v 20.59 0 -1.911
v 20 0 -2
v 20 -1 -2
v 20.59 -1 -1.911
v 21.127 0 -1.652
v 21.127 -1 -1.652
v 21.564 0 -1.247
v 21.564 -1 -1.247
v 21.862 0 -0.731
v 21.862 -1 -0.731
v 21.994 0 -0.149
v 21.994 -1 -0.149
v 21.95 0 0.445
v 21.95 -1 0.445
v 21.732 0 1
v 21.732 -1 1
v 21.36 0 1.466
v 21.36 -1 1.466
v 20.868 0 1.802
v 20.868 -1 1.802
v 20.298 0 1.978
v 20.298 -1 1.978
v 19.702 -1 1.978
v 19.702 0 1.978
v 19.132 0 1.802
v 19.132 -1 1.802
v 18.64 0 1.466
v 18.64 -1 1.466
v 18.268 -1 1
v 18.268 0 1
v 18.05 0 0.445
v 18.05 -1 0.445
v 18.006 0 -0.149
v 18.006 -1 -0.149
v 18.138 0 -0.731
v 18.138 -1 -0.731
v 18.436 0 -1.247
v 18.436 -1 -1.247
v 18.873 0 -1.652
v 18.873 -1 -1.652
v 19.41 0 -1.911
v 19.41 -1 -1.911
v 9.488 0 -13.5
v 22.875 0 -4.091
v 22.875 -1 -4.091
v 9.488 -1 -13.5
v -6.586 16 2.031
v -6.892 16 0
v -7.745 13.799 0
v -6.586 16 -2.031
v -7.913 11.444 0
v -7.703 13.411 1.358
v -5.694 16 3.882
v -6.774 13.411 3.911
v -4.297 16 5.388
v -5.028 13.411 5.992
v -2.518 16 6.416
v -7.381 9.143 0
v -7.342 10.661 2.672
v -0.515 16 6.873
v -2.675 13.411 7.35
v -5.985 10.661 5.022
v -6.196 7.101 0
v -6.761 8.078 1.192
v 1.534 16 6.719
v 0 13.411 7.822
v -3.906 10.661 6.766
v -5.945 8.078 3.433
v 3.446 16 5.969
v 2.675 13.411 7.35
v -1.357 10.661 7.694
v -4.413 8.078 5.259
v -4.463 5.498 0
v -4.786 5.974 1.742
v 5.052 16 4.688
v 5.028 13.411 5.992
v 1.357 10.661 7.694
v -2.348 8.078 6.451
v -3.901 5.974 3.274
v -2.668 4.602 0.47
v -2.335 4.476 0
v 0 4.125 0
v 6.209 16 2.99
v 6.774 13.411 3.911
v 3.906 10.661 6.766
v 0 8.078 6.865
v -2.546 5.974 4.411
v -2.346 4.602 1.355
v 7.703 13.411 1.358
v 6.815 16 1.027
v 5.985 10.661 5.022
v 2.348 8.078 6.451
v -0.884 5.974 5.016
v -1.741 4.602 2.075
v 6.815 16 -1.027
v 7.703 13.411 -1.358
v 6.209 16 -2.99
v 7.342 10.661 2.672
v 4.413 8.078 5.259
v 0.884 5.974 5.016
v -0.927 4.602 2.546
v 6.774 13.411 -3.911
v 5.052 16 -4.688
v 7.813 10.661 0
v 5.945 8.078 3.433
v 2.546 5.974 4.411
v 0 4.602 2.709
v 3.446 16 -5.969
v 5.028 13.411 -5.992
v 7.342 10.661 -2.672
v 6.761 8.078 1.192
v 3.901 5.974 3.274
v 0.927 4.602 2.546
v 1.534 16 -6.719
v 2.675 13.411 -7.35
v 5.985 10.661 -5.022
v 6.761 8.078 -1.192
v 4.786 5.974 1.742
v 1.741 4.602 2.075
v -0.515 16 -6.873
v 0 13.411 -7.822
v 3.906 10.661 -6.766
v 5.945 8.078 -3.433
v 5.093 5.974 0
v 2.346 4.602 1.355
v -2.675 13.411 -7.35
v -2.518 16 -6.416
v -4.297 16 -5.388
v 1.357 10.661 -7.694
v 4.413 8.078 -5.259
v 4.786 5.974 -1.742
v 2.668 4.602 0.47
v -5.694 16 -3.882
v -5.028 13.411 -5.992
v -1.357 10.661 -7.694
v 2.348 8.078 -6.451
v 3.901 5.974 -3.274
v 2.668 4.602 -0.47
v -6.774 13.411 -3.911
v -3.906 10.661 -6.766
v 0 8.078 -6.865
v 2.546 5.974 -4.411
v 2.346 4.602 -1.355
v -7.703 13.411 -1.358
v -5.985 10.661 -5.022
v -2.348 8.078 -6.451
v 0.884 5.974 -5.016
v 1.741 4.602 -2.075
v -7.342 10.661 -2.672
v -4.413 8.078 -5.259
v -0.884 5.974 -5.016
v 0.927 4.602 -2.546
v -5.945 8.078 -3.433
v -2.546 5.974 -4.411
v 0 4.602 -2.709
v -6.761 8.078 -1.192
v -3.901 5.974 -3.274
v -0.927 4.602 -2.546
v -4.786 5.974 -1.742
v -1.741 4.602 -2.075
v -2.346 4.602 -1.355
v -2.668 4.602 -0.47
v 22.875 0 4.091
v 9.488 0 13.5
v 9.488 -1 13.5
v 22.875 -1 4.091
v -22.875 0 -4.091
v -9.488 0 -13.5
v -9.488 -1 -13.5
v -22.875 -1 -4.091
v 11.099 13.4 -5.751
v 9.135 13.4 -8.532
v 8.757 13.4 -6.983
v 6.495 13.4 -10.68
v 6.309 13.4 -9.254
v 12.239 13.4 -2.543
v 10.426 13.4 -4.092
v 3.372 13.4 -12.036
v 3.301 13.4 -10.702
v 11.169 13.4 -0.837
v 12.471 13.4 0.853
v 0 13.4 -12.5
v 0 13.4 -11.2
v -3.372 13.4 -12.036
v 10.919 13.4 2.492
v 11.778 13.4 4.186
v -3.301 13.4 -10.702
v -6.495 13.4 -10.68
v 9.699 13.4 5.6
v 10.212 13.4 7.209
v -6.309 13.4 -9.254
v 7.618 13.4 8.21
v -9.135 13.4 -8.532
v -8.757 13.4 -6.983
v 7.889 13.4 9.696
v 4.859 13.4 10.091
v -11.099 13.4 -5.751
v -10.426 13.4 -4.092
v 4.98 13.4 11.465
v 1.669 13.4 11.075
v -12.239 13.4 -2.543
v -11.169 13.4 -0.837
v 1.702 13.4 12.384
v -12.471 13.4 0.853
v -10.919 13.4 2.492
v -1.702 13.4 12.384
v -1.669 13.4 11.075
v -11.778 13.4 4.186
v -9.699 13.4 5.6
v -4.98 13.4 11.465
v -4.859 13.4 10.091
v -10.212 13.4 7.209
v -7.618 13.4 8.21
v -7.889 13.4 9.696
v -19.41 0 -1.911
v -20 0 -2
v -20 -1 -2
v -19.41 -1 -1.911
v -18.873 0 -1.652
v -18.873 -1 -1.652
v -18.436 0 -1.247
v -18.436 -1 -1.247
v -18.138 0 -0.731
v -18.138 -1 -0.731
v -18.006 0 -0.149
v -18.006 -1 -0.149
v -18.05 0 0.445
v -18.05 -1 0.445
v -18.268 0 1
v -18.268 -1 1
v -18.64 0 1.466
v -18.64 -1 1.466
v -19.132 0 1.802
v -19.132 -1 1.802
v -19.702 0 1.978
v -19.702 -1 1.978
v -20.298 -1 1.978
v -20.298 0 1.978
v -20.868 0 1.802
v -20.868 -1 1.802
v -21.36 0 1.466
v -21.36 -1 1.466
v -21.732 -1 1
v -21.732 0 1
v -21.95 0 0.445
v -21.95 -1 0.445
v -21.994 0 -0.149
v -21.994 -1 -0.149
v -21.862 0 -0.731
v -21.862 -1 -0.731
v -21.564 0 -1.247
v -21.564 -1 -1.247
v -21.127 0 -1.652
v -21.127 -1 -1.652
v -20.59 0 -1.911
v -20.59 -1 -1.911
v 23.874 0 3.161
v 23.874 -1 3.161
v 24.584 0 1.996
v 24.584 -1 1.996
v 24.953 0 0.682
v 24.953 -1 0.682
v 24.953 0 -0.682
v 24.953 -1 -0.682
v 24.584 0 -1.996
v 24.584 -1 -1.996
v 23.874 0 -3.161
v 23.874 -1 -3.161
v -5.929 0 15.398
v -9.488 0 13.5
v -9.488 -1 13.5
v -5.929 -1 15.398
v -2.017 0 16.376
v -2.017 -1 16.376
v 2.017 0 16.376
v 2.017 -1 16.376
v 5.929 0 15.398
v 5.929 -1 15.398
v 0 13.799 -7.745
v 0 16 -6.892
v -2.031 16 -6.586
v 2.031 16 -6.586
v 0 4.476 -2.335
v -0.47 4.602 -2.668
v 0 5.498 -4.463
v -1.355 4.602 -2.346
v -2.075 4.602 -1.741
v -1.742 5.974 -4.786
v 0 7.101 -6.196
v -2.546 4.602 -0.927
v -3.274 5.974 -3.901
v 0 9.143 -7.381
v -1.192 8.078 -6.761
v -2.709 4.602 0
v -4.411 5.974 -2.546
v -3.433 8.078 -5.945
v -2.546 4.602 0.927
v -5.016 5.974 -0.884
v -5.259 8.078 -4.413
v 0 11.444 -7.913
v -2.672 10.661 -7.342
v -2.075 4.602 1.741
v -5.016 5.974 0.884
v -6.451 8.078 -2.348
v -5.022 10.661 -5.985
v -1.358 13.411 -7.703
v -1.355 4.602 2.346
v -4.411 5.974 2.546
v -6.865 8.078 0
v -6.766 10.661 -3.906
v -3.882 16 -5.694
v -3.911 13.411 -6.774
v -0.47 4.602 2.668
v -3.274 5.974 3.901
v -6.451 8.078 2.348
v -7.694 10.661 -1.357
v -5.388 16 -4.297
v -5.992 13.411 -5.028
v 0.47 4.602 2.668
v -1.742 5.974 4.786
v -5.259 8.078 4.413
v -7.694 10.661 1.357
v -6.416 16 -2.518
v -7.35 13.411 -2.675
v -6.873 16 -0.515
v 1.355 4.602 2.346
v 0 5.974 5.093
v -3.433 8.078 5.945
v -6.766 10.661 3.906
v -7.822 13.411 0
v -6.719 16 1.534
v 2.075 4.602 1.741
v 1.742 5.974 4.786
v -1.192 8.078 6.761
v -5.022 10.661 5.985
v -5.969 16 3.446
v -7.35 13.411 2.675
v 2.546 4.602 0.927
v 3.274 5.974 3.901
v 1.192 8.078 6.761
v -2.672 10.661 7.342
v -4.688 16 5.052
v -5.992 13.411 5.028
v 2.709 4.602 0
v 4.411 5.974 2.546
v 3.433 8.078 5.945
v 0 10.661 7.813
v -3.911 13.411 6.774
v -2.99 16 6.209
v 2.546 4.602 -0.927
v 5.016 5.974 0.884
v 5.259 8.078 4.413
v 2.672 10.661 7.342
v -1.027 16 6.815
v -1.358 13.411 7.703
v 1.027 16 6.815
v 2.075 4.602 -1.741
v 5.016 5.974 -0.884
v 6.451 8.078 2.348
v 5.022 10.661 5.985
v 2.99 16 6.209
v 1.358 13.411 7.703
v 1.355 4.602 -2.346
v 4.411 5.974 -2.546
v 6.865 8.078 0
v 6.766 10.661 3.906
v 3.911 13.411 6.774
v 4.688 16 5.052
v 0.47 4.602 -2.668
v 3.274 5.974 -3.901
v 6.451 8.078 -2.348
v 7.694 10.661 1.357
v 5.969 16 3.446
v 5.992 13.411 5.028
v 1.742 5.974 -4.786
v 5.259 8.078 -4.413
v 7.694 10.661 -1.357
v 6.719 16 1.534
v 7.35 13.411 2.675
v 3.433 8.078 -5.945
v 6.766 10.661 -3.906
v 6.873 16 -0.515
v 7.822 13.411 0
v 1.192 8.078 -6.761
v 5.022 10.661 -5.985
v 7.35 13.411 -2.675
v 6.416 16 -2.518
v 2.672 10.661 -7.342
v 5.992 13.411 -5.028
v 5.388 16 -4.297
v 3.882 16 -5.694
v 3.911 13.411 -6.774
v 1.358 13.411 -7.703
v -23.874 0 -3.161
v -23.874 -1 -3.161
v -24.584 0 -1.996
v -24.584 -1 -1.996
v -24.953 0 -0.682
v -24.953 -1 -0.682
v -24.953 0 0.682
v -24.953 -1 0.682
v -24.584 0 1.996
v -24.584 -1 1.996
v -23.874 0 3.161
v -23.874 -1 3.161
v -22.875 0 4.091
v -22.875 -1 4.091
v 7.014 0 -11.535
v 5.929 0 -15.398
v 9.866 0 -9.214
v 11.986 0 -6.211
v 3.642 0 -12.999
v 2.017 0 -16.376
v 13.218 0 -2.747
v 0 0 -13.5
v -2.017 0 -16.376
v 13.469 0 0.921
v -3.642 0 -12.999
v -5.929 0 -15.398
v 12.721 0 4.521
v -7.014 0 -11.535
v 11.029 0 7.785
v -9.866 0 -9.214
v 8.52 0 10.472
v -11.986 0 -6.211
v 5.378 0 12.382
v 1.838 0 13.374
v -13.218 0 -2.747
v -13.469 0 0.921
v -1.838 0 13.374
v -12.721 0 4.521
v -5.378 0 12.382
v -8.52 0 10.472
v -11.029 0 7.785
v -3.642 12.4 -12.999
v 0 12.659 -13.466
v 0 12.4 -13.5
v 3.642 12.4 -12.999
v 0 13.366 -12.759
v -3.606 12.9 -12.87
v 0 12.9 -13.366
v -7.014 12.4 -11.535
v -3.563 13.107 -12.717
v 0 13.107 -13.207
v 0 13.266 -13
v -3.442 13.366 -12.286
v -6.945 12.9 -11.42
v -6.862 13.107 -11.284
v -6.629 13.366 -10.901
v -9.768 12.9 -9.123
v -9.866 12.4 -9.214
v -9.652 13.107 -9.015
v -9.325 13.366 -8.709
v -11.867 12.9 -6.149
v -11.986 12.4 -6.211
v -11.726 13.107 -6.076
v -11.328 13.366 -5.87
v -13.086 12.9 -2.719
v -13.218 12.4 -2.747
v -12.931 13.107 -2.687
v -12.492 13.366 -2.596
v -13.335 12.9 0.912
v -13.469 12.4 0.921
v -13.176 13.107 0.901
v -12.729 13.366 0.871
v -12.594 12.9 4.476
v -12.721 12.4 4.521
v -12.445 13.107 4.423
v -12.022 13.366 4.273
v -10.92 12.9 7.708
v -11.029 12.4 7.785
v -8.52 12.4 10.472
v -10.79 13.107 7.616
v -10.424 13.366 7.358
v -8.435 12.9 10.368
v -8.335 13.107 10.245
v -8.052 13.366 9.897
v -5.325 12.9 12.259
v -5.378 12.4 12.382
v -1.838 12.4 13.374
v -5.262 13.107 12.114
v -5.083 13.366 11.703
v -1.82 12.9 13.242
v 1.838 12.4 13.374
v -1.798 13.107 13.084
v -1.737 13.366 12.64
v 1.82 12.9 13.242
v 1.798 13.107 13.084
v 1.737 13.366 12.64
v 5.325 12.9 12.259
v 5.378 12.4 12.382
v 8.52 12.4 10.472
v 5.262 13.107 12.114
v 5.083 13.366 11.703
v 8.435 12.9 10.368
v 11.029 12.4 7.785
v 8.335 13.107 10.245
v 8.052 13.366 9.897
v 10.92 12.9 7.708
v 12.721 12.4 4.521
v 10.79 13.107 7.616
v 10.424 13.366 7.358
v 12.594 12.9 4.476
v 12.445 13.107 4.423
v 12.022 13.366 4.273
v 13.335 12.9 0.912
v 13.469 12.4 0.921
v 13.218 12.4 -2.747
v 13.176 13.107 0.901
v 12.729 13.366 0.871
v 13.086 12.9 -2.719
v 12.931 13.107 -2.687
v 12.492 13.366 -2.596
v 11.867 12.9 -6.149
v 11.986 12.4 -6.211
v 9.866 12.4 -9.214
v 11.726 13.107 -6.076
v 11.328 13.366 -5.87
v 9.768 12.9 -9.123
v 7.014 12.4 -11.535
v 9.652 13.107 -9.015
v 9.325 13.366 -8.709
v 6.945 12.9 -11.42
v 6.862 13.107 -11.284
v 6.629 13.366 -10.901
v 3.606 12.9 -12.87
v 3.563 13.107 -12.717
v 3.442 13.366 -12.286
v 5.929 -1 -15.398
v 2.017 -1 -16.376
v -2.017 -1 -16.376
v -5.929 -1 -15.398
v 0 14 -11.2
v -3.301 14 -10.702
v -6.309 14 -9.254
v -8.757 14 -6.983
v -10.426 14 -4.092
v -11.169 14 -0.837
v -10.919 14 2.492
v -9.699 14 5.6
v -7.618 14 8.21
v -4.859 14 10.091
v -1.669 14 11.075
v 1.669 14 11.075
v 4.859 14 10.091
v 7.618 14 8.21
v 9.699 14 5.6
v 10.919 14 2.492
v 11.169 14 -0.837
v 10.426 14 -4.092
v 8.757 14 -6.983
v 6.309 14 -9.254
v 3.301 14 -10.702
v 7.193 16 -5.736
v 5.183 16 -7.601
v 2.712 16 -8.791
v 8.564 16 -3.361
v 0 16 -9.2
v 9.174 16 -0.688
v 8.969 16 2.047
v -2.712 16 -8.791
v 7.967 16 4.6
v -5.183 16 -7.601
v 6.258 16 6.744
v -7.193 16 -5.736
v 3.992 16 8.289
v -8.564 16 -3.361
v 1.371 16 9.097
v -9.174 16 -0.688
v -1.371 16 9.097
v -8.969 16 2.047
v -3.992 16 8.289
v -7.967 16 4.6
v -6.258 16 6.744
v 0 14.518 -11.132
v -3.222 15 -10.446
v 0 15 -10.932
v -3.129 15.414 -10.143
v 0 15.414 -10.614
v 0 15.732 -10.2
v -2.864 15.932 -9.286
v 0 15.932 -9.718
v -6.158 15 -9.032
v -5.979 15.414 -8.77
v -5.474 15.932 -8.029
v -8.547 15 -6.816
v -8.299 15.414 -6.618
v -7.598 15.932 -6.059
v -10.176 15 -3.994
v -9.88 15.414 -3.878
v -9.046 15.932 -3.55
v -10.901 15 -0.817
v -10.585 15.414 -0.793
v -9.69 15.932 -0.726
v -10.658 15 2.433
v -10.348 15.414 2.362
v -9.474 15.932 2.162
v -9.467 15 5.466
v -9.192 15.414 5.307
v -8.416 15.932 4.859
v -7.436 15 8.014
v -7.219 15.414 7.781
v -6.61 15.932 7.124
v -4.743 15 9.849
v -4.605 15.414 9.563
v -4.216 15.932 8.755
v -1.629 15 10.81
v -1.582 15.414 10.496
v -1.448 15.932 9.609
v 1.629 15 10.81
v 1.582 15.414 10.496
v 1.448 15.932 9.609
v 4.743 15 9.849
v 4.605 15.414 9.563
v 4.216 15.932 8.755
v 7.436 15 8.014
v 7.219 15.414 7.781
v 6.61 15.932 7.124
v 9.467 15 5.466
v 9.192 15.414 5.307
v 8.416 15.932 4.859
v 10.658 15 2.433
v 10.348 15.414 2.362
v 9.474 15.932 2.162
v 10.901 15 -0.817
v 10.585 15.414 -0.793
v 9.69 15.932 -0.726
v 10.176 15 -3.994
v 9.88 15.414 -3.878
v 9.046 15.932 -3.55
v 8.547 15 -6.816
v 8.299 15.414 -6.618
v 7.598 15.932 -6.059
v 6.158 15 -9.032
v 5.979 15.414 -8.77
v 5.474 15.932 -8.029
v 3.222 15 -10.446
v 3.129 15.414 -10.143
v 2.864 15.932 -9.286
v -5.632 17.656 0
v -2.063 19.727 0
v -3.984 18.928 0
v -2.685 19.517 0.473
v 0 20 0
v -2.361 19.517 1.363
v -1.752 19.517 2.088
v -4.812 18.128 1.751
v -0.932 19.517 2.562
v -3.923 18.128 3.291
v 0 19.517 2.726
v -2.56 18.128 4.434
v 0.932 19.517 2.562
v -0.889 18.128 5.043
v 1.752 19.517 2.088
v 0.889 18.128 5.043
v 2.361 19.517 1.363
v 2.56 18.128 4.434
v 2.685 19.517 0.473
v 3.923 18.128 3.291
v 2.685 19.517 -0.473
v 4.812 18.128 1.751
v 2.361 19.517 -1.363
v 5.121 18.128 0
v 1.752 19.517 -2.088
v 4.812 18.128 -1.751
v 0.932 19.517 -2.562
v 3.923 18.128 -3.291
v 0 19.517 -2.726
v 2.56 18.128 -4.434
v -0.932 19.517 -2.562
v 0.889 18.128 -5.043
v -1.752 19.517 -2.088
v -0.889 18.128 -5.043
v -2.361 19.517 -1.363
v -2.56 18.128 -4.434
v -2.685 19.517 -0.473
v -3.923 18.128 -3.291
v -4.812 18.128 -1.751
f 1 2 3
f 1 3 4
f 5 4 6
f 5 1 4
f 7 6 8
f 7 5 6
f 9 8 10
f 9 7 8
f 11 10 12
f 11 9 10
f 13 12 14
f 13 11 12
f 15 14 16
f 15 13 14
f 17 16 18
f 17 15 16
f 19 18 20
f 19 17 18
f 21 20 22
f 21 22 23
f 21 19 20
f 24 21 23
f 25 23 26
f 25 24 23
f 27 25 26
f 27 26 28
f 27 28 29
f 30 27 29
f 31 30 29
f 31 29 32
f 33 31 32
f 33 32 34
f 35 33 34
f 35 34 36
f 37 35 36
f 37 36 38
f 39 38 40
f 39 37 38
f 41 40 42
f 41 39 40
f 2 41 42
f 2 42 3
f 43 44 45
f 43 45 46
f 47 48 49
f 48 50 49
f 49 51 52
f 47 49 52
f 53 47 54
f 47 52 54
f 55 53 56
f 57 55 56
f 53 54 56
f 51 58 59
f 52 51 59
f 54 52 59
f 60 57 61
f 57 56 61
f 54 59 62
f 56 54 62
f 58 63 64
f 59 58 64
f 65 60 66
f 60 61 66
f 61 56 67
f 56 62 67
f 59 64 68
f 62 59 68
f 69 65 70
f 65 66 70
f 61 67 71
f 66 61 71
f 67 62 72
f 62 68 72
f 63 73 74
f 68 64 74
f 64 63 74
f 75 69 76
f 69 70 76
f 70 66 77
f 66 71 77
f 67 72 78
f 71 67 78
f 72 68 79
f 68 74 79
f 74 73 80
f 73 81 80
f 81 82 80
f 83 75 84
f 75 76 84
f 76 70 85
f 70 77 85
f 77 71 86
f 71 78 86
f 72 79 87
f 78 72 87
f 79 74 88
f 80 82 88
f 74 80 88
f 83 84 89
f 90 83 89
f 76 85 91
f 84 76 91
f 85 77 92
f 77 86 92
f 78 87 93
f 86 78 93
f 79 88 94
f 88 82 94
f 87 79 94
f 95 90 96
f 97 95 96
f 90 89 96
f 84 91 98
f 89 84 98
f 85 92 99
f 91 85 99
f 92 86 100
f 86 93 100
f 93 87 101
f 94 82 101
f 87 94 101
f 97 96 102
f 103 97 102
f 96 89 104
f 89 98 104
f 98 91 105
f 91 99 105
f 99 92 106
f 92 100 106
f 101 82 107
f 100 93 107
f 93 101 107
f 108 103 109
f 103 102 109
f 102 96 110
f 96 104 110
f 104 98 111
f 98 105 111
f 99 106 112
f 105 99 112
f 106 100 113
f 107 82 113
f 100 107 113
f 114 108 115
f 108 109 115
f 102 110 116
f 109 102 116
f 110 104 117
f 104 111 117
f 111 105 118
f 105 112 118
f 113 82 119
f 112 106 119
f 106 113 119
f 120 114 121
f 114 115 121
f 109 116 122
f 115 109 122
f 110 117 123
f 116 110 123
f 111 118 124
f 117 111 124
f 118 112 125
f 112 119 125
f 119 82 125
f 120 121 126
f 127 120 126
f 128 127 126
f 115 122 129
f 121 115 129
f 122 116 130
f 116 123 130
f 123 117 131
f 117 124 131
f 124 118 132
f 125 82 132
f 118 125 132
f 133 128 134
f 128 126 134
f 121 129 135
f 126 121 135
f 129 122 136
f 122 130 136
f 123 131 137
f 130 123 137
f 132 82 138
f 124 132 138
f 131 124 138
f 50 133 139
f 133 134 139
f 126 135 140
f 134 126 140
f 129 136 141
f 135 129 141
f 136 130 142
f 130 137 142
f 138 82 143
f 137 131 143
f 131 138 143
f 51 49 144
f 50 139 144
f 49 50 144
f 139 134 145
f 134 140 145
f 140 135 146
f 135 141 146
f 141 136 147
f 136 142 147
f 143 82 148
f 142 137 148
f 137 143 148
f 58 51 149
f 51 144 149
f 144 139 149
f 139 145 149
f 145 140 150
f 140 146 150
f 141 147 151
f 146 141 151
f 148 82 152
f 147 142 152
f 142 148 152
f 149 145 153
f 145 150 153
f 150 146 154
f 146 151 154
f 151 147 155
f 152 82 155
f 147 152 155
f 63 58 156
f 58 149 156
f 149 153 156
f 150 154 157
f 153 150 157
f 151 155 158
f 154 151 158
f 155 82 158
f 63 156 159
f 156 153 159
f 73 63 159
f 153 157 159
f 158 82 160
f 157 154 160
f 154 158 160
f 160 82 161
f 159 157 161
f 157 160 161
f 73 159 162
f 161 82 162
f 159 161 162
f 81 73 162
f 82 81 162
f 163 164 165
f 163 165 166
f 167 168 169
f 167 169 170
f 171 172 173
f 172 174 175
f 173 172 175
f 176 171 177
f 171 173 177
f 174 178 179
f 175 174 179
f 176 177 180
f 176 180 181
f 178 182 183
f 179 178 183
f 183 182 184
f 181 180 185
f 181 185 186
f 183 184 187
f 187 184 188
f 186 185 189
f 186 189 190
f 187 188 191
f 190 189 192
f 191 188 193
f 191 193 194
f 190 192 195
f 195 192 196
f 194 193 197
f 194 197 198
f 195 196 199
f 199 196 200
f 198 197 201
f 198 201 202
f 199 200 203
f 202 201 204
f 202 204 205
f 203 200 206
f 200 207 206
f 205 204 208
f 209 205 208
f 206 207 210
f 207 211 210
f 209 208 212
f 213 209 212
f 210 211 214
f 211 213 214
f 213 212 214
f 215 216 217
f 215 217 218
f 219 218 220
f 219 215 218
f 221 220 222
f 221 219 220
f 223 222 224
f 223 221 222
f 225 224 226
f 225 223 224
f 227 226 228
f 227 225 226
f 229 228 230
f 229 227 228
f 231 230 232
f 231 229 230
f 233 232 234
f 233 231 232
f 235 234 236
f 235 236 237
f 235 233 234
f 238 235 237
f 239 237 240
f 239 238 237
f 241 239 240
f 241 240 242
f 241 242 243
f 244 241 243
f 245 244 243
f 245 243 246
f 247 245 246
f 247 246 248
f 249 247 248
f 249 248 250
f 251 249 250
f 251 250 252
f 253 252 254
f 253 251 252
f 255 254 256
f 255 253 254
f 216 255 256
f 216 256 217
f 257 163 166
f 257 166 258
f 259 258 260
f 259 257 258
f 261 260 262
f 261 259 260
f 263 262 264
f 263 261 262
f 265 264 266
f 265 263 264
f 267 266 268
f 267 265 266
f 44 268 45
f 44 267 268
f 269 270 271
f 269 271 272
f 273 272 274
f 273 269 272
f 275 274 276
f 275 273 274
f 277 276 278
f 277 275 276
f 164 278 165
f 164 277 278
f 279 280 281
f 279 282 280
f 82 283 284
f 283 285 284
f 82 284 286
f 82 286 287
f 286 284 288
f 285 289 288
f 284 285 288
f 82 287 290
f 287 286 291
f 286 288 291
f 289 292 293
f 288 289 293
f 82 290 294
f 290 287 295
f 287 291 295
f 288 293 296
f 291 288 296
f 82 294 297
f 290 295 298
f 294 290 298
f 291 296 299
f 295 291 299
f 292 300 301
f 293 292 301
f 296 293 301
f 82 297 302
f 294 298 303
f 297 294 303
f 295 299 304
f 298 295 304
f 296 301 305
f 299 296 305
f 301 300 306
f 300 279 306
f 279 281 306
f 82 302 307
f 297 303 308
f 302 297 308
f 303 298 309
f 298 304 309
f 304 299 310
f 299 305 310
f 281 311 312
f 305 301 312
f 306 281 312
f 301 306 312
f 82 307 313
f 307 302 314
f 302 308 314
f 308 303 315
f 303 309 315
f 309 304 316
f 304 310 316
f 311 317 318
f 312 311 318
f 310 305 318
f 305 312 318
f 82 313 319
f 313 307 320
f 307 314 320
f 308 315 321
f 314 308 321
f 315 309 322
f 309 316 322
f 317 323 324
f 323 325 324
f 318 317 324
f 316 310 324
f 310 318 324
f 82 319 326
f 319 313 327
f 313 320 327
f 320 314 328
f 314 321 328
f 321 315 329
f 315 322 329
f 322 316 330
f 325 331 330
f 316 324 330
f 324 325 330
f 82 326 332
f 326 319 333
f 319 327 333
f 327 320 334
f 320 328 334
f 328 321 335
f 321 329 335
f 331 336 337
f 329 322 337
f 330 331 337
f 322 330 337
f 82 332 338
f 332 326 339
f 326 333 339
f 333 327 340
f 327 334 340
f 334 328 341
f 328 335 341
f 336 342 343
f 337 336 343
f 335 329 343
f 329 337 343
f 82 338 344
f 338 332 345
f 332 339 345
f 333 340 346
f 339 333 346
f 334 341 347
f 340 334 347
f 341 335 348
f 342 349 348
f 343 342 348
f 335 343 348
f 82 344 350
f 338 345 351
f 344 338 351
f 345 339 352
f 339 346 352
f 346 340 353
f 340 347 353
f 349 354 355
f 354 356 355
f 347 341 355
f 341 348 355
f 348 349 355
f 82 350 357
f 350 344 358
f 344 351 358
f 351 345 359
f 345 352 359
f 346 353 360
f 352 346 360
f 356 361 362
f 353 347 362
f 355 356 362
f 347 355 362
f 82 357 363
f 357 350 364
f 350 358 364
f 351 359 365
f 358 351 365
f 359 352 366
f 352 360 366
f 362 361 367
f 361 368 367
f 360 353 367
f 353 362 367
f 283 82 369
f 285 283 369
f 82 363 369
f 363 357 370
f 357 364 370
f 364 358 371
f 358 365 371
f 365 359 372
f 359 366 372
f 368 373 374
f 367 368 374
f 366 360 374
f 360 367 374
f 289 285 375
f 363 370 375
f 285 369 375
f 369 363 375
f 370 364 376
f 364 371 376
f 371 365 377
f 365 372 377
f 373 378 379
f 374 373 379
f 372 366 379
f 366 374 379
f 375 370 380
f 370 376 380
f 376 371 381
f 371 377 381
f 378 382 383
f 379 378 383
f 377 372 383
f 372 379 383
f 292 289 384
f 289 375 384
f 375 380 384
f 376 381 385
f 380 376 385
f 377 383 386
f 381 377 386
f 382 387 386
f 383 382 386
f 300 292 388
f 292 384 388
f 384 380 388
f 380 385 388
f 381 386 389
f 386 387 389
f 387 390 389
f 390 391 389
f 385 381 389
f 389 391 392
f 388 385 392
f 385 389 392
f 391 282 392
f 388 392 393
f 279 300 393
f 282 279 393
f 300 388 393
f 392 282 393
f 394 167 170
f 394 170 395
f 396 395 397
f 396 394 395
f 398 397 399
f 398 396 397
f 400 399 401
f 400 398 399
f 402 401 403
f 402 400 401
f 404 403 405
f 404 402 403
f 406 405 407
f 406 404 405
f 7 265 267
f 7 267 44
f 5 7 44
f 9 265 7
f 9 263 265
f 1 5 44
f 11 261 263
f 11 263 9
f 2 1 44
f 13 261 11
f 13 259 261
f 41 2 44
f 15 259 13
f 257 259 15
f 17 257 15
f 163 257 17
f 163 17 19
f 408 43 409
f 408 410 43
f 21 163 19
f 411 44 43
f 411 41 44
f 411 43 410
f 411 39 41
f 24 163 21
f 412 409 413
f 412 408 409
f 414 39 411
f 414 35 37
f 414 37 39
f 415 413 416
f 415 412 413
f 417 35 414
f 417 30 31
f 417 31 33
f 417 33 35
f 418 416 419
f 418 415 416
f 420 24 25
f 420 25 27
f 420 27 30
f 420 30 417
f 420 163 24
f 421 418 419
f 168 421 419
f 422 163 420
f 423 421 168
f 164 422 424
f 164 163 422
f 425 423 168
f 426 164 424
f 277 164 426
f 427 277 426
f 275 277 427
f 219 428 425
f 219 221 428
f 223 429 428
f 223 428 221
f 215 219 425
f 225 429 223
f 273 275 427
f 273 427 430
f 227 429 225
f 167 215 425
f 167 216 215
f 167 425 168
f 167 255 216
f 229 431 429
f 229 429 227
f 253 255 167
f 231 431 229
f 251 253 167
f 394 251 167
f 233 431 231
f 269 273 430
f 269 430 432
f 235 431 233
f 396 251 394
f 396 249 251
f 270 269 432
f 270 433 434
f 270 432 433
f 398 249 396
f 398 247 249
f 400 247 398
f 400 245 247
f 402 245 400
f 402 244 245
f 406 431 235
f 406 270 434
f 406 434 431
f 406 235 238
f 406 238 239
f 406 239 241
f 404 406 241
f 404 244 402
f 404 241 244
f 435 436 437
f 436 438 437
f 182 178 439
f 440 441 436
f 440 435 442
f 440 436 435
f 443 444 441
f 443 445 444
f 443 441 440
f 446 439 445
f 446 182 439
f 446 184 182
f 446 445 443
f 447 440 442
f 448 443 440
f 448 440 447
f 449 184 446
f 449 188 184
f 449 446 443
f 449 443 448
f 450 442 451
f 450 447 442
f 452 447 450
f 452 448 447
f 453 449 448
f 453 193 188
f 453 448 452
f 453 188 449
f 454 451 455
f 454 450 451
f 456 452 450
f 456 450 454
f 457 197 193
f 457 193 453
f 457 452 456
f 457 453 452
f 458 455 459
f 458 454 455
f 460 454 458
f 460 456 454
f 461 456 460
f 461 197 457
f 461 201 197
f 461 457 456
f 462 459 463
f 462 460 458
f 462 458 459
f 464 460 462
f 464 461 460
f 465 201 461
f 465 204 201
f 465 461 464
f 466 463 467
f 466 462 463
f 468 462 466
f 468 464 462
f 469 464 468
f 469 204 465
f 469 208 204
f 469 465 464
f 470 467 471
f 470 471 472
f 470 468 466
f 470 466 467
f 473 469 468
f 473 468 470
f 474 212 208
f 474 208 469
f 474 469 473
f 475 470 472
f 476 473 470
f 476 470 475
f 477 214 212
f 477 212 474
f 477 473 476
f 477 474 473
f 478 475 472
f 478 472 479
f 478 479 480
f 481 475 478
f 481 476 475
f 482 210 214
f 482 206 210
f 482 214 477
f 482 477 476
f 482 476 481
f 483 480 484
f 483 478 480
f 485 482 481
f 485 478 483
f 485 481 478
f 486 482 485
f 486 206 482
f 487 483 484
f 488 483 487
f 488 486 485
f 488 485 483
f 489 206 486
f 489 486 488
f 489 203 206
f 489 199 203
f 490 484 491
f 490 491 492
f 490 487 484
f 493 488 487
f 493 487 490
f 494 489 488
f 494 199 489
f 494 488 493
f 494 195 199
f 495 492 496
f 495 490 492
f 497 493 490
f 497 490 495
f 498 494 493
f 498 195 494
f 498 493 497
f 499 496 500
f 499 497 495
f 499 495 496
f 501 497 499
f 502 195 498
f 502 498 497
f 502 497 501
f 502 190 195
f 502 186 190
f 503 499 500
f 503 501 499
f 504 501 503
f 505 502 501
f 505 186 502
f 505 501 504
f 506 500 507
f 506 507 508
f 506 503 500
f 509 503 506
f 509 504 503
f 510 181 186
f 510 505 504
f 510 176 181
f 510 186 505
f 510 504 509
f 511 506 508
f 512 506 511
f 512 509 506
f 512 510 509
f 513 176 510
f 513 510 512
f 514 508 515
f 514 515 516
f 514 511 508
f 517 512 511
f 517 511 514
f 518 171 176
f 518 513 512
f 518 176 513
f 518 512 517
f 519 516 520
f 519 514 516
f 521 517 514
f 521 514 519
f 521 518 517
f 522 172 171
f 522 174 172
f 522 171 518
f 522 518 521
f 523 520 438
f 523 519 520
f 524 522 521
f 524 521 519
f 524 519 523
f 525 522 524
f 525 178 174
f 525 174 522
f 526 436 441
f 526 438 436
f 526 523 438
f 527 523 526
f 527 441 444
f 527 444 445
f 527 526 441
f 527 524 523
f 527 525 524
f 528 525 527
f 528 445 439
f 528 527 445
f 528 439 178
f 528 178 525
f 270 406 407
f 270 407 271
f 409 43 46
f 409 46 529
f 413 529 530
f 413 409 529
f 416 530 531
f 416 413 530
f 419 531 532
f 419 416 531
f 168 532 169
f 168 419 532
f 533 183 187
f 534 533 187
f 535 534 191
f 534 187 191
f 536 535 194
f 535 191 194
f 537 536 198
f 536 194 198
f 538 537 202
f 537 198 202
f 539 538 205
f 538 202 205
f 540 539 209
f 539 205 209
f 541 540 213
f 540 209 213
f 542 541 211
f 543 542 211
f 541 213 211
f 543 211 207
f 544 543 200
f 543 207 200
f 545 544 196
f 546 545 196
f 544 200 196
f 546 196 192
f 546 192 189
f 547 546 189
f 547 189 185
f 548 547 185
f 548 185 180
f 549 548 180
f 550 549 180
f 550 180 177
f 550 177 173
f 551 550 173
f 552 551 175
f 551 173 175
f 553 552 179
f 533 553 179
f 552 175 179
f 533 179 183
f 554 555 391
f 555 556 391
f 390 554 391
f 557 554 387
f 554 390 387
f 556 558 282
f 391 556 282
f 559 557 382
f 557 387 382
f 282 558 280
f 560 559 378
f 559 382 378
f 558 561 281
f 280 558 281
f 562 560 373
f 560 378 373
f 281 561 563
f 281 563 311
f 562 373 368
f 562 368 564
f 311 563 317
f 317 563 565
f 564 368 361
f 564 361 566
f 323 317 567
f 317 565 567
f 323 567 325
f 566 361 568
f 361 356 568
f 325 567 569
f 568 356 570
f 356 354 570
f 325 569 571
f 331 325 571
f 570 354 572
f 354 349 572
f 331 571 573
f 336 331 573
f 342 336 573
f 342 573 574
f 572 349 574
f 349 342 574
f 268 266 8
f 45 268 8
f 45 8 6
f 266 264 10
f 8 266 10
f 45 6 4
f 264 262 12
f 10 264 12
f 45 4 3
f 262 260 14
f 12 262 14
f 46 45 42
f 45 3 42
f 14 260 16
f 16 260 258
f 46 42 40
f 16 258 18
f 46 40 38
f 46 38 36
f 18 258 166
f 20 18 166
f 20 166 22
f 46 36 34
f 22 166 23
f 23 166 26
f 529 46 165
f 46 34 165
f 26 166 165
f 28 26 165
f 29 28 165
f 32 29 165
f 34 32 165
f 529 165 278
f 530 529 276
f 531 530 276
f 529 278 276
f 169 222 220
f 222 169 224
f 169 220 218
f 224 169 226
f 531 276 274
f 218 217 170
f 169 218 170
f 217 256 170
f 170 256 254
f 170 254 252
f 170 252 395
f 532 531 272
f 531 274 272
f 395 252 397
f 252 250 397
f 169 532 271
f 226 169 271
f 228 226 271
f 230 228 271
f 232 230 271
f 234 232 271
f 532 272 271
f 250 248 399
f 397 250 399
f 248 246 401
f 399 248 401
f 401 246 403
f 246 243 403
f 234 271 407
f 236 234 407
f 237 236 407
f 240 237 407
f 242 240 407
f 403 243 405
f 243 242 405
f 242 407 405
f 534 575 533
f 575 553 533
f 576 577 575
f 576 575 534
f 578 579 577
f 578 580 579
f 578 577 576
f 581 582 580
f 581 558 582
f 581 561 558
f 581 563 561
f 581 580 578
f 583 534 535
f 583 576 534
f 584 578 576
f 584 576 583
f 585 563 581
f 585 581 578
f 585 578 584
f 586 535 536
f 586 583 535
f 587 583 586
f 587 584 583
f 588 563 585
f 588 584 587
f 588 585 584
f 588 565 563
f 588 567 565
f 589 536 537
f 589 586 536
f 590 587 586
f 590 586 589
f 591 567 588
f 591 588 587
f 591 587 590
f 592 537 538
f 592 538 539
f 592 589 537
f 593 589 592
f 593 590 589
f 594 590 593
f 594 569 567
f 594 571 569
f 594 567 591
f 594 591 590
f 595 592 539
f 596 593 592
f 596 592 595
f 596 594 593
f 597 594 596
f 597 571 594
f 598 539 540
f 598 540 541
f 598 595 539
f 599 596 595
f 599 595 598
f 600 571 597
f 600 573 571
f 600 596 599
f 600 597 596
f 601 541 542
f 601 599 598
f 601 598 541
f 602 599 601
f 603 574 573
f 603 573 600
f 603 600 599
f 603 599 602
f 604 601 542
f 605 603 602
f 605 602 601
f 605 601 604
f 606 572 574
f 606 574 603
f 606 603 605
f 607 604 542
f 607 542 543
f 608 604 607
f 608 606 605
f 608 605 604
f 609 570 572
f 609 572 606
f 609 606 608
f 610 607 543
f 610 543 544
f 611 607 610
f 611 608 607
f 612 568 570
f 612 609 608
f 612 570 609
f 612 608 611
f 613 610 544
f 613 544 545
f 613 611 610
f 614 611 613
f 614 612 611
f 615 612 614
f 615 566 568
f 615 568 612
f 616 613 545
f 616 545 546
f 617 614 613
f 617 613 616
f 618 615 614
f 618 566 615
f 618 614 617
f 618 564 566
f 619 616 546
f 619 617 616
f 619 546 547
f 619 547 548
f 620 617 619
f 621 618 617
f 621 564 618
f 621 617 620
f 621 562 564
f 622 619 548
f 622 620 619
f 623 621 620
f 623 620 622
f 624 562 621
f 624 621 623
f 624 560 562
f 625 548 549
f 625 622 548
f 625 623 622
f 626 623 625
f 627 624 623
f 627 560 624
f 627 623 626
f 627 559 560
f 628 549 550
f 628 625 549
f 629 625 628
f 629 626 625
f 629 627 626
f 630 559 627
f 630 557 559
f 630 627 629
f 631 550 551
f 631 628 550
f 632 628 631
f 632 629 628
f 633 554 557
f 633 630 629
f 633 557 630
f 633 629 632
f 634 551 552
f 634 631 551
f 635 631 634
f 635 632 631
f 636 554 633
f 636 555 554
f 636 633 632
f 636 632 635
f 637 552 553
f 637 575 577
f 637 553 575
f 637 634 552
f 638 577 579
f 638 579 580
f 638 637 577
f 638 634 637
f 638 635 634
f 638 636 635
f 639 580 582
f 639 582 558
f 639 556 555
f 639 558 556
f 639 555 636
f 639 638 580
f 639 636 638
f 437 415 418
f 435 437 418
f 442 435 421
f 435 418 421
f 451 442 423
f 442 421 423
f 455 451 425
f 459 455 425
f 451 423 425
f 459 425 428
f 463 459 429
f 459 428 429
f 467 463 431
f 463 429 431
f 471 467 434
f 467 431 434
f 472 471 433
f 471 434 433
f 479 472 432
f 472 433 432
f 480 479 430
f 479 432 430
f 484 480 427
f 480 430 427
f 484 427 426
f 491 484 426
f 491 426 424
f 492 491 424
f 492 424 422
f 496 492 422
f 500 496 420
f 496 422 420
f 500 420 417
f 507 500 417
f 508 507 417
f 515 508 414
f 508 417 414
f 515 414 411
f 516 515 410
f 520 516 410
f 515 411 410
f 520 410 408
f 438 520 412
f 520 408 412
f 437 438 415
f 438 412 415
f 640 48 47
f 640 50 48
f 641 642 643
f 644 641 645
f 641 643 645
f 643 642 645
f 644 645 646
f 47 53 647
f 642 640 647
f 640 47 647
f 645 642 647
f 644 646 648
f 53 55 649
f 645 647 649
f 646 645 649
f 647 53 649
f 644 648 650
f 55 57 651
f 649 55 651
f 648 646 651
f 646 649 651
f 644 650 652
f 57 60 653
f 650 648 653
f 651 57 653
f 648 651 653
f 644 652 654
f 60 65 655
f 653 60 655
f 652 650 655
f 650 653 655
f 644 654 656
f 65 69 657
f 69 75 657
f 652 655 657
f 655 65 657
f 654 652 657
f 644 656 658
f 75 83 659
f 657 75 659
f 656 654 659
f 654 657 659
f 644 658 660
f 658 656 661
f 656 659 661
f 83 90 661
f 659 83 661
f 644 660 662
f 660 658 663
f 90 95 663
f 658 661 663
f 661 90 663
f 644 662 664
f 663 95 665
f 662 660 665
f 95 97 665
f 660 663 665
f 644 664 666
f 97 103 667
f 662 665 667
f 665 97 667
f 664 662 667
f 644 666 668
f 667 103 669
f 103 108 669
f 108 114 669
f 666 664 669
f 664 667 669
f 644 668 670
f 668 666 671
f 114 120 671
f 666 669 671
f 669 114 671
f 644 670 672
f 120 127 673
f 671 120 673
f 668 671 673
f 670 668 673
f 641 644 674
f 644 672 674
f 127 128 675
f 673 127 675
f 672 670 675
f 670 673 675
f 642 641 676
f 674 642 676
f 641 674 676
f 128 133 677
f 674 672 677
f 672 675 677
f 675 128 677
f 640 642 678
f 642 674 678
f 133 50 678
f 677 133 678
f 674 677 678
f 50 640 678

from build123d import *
from OCP.BRepFilletAPI import BRepFilletAPI_MakeFillet

# Parameters (mm, degrees)
SKETCH2_R           = 2
BOSS_EXTRUDE1_DEPTH = 1
FILLET1_R1          = 2
FILLET1_R2          = 1


with BuildPart() as part:
    # Sketch1 → Revolve1 (revolve)
    with BuildSketch(Plane.XY):
        with BuildLine():
            Line((-13.5, 0), (0, 0))
            Line((0, 0), (0, 4.125))
            ThreePointArc((0, 4.125), (-6.865049617, 8.078155637), (-6.892024376, 16))
            Line((-6.892024376, 16), (-11.2, 16))
            Line((-11.2, 16), (-11.2, 13.4))
            Line((-11.2, 13.4), (-13.5, 13.4))
            Line((-13.5, 13.4), (-13.5, 0))
        make_face()
    revolve(axis=Axis((0, 0, 0), (0, 1, 0)))

    # Sketch2 → Boss-Extrude1 (add)
    with BuildSketch(Plane.XZ):
        with BuildLine():
            Line((-22.875, 4.090767043), (-9.4875, 13.499531242))
            ThreePointArc((-9.4875, 13.499531242), (0, 16.5), (9.4875, 13.499531242))
            Line((9.4875, 13.499531242), (22.875, 4.090767043))
            ThreePointArc((22.875, 4.090767043), (25, 0), (22.875, -4.090767043))
            Line((22.875, -4.090767043), (9.4875, -13.499531242))
            ThreePointArc((9.4875, -13.499531242), (0, -16.5), (-9.4875, -13.499531242))
            Line((-9.4875, -13.499531242), (-22.875, -4.090767043))
            ThreePointArc((-22.875, -4.090767043), (-25, 0), (-22.875, 4.090767043))
        make_face()
        with Locations((-20, 0)):
            Circle(SKETCH2_R, mode=Mode.SUBTRACT)
        with Locations((20, 0)):
            Circle(SKETCH2_R, mode=Mode.SUBTRACT)
    extrude(amount=BOSS_EXTRUDE1_DEPTH)

    # Fillet1: one fillet with a radius per group of edges: ONE call of the kernel's fillet builder (fillet() takes one radius for all edges)
    fillet1_edges_1 = [part.edges().sort_by_distance(p)[0] for p in [
        (11.2, 16, 0),
    ]]
    fillet1_edges_2 = [part.edges().sort_by_distance(p)[0] for p in [
        (13.5, 13.4, 0),
    ]]
    fillet1 = BRepFilletAPI_MakeFillet(part.part.solid().wrapped)
    for e in fillet1_edges_1:
        fillet1.Add(FILLET1_R1, e.wrapped)
    for e in fillet1_edges_2:
        fillet1.Add(FILLET1_R2, e.wrapped)
    add(Compound.cast(fillet1.Shape()), mode=Mode.REPLACE)


with BuildPart() as body_2:
    # Sketch1<4> → Revolve2 (revolve)
    with BuildSketch(Plane.XY):
        with BuildLine():
            ThreePointArc((-6.892024376, 16), (-6.865049617, 8.078155637), (0, 4.125))
            Line((0, 4.125), (0, 20))
            ThreePointArc((0, 20), (-3.984344363, 18.927549617), (-6.892024376, 16))
        make_face()
    revolve(axis=Axis((0, 0, 0), (0, 1, 0)))


solid = Compound([part.part, body_2.part])
